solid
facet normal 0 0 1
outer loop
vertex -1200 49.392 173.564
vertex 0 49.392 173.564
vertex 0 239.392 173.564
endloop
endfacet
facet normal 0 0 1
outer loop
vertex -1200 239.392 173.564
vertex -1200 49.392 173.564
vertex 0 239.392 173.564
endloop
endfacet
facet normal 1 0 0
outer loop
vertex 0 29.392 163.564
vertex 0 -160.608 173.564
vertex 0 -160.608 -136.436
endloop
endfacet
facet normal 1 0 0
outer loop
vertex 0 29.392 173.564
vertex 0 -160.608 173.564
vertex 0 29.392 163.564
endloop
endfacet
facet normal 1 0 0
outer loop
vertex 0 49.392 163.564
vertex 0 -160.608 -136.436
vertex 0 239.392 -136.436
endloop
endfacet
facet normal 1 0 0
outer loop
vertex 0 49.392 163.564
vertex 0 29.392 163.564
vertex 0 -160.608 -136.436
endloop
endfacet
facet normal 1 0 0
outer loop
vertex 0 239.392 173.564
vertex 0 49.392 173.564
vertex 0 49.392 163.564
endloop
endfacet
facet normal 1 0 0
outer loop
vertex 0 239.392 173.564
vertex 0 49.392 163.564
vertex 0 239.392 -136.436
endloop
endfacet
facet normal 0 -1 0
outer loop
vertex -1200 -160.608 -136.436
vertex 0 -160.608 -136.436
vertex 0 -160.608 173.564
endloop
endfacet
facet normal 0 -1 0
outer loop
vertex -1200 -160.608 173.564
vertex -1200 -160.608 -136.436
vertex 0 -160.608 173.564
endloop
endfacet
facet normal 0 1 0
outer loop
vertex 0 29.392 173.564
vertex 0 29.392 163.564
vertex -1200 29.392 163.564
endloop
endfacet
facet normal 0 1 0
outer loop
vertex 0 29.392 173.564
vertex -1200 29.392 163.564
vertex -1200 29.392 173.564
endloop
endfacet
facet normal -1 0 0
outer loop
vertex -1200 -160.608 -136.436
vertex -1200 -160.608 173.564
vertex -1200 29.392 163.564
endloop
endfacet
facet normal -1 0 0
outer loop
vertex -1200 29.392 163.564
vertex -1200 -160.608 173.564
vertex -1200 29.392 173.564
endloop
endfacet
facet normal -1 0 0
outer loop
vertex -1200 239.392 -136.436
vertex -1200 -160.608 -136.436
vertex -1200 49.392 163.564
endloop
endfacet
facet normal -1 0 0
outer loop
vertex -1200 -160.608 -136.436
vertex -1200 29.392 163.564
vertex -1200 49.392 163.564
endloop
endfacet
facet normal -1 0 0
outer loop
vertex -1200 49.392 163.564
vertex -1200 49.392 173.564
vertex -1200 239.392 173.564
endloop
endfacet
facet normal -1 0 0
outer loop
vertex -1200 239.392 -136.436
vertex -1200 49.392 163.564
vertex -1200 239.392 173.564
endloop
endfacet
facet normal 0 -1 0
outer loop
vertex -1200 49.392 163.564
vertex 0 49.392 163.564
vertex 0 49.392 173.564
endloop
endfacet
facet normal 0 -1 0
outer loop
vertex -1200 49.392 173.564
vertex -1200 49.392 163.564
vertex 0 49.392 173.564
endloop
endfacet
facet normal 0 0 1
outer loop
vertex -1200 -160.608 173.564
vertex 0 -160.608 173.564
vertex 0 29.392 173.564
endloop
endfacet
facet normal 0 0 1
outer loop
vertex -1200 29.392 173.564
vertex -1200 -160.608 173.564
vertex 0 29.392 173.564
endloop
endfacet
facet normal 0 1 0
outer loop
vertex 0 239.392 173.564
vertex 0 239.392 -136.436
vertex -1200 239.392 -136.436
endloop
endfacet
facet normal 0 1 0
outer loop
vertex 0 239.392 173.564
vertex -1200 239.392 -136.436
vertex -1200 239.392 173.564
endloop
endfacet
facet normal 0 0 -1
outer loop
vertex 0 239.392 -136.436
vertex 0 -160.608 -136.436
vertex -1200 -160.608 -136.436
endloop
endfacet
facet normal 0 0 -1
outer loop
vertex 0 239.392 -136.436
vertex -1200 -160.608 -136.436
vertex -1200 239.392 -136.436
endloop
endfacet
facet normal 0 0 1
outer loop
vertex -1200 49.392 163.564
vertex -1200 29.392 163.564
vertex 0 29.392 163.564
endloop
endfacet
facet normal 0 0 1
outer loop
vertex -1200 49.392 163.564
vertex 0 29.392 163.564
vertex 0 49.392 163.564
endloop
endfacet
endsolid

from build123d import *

# Parameters (mm, degrees)
F0_W     = 400
F0_H     = 310
F1_DEPTH = 1200
F2_W     = 20
F2_H     = 10
F3_DEPTH = 1250


with BuildPart() as f1:
    # F0 (on Right) → F1 (new body)
    with BuildSketch(Plane.YZ):
        with Locations((39.391704, 18.56401)):
            Rectangle(F0_W, F0_H)
    extrude(amount=-F1_DEPTH)

    # F2 (on face) → F3 (cut)
    with BuildSketch(Plane.YZ):
        with Locations((39.391704, 168.56401)):
            Rectangle(F2_W, F2_H)
    extrude(amount=-F3_DEPTH, mode=Mode.SUBTRACT)


solid = f1.part
